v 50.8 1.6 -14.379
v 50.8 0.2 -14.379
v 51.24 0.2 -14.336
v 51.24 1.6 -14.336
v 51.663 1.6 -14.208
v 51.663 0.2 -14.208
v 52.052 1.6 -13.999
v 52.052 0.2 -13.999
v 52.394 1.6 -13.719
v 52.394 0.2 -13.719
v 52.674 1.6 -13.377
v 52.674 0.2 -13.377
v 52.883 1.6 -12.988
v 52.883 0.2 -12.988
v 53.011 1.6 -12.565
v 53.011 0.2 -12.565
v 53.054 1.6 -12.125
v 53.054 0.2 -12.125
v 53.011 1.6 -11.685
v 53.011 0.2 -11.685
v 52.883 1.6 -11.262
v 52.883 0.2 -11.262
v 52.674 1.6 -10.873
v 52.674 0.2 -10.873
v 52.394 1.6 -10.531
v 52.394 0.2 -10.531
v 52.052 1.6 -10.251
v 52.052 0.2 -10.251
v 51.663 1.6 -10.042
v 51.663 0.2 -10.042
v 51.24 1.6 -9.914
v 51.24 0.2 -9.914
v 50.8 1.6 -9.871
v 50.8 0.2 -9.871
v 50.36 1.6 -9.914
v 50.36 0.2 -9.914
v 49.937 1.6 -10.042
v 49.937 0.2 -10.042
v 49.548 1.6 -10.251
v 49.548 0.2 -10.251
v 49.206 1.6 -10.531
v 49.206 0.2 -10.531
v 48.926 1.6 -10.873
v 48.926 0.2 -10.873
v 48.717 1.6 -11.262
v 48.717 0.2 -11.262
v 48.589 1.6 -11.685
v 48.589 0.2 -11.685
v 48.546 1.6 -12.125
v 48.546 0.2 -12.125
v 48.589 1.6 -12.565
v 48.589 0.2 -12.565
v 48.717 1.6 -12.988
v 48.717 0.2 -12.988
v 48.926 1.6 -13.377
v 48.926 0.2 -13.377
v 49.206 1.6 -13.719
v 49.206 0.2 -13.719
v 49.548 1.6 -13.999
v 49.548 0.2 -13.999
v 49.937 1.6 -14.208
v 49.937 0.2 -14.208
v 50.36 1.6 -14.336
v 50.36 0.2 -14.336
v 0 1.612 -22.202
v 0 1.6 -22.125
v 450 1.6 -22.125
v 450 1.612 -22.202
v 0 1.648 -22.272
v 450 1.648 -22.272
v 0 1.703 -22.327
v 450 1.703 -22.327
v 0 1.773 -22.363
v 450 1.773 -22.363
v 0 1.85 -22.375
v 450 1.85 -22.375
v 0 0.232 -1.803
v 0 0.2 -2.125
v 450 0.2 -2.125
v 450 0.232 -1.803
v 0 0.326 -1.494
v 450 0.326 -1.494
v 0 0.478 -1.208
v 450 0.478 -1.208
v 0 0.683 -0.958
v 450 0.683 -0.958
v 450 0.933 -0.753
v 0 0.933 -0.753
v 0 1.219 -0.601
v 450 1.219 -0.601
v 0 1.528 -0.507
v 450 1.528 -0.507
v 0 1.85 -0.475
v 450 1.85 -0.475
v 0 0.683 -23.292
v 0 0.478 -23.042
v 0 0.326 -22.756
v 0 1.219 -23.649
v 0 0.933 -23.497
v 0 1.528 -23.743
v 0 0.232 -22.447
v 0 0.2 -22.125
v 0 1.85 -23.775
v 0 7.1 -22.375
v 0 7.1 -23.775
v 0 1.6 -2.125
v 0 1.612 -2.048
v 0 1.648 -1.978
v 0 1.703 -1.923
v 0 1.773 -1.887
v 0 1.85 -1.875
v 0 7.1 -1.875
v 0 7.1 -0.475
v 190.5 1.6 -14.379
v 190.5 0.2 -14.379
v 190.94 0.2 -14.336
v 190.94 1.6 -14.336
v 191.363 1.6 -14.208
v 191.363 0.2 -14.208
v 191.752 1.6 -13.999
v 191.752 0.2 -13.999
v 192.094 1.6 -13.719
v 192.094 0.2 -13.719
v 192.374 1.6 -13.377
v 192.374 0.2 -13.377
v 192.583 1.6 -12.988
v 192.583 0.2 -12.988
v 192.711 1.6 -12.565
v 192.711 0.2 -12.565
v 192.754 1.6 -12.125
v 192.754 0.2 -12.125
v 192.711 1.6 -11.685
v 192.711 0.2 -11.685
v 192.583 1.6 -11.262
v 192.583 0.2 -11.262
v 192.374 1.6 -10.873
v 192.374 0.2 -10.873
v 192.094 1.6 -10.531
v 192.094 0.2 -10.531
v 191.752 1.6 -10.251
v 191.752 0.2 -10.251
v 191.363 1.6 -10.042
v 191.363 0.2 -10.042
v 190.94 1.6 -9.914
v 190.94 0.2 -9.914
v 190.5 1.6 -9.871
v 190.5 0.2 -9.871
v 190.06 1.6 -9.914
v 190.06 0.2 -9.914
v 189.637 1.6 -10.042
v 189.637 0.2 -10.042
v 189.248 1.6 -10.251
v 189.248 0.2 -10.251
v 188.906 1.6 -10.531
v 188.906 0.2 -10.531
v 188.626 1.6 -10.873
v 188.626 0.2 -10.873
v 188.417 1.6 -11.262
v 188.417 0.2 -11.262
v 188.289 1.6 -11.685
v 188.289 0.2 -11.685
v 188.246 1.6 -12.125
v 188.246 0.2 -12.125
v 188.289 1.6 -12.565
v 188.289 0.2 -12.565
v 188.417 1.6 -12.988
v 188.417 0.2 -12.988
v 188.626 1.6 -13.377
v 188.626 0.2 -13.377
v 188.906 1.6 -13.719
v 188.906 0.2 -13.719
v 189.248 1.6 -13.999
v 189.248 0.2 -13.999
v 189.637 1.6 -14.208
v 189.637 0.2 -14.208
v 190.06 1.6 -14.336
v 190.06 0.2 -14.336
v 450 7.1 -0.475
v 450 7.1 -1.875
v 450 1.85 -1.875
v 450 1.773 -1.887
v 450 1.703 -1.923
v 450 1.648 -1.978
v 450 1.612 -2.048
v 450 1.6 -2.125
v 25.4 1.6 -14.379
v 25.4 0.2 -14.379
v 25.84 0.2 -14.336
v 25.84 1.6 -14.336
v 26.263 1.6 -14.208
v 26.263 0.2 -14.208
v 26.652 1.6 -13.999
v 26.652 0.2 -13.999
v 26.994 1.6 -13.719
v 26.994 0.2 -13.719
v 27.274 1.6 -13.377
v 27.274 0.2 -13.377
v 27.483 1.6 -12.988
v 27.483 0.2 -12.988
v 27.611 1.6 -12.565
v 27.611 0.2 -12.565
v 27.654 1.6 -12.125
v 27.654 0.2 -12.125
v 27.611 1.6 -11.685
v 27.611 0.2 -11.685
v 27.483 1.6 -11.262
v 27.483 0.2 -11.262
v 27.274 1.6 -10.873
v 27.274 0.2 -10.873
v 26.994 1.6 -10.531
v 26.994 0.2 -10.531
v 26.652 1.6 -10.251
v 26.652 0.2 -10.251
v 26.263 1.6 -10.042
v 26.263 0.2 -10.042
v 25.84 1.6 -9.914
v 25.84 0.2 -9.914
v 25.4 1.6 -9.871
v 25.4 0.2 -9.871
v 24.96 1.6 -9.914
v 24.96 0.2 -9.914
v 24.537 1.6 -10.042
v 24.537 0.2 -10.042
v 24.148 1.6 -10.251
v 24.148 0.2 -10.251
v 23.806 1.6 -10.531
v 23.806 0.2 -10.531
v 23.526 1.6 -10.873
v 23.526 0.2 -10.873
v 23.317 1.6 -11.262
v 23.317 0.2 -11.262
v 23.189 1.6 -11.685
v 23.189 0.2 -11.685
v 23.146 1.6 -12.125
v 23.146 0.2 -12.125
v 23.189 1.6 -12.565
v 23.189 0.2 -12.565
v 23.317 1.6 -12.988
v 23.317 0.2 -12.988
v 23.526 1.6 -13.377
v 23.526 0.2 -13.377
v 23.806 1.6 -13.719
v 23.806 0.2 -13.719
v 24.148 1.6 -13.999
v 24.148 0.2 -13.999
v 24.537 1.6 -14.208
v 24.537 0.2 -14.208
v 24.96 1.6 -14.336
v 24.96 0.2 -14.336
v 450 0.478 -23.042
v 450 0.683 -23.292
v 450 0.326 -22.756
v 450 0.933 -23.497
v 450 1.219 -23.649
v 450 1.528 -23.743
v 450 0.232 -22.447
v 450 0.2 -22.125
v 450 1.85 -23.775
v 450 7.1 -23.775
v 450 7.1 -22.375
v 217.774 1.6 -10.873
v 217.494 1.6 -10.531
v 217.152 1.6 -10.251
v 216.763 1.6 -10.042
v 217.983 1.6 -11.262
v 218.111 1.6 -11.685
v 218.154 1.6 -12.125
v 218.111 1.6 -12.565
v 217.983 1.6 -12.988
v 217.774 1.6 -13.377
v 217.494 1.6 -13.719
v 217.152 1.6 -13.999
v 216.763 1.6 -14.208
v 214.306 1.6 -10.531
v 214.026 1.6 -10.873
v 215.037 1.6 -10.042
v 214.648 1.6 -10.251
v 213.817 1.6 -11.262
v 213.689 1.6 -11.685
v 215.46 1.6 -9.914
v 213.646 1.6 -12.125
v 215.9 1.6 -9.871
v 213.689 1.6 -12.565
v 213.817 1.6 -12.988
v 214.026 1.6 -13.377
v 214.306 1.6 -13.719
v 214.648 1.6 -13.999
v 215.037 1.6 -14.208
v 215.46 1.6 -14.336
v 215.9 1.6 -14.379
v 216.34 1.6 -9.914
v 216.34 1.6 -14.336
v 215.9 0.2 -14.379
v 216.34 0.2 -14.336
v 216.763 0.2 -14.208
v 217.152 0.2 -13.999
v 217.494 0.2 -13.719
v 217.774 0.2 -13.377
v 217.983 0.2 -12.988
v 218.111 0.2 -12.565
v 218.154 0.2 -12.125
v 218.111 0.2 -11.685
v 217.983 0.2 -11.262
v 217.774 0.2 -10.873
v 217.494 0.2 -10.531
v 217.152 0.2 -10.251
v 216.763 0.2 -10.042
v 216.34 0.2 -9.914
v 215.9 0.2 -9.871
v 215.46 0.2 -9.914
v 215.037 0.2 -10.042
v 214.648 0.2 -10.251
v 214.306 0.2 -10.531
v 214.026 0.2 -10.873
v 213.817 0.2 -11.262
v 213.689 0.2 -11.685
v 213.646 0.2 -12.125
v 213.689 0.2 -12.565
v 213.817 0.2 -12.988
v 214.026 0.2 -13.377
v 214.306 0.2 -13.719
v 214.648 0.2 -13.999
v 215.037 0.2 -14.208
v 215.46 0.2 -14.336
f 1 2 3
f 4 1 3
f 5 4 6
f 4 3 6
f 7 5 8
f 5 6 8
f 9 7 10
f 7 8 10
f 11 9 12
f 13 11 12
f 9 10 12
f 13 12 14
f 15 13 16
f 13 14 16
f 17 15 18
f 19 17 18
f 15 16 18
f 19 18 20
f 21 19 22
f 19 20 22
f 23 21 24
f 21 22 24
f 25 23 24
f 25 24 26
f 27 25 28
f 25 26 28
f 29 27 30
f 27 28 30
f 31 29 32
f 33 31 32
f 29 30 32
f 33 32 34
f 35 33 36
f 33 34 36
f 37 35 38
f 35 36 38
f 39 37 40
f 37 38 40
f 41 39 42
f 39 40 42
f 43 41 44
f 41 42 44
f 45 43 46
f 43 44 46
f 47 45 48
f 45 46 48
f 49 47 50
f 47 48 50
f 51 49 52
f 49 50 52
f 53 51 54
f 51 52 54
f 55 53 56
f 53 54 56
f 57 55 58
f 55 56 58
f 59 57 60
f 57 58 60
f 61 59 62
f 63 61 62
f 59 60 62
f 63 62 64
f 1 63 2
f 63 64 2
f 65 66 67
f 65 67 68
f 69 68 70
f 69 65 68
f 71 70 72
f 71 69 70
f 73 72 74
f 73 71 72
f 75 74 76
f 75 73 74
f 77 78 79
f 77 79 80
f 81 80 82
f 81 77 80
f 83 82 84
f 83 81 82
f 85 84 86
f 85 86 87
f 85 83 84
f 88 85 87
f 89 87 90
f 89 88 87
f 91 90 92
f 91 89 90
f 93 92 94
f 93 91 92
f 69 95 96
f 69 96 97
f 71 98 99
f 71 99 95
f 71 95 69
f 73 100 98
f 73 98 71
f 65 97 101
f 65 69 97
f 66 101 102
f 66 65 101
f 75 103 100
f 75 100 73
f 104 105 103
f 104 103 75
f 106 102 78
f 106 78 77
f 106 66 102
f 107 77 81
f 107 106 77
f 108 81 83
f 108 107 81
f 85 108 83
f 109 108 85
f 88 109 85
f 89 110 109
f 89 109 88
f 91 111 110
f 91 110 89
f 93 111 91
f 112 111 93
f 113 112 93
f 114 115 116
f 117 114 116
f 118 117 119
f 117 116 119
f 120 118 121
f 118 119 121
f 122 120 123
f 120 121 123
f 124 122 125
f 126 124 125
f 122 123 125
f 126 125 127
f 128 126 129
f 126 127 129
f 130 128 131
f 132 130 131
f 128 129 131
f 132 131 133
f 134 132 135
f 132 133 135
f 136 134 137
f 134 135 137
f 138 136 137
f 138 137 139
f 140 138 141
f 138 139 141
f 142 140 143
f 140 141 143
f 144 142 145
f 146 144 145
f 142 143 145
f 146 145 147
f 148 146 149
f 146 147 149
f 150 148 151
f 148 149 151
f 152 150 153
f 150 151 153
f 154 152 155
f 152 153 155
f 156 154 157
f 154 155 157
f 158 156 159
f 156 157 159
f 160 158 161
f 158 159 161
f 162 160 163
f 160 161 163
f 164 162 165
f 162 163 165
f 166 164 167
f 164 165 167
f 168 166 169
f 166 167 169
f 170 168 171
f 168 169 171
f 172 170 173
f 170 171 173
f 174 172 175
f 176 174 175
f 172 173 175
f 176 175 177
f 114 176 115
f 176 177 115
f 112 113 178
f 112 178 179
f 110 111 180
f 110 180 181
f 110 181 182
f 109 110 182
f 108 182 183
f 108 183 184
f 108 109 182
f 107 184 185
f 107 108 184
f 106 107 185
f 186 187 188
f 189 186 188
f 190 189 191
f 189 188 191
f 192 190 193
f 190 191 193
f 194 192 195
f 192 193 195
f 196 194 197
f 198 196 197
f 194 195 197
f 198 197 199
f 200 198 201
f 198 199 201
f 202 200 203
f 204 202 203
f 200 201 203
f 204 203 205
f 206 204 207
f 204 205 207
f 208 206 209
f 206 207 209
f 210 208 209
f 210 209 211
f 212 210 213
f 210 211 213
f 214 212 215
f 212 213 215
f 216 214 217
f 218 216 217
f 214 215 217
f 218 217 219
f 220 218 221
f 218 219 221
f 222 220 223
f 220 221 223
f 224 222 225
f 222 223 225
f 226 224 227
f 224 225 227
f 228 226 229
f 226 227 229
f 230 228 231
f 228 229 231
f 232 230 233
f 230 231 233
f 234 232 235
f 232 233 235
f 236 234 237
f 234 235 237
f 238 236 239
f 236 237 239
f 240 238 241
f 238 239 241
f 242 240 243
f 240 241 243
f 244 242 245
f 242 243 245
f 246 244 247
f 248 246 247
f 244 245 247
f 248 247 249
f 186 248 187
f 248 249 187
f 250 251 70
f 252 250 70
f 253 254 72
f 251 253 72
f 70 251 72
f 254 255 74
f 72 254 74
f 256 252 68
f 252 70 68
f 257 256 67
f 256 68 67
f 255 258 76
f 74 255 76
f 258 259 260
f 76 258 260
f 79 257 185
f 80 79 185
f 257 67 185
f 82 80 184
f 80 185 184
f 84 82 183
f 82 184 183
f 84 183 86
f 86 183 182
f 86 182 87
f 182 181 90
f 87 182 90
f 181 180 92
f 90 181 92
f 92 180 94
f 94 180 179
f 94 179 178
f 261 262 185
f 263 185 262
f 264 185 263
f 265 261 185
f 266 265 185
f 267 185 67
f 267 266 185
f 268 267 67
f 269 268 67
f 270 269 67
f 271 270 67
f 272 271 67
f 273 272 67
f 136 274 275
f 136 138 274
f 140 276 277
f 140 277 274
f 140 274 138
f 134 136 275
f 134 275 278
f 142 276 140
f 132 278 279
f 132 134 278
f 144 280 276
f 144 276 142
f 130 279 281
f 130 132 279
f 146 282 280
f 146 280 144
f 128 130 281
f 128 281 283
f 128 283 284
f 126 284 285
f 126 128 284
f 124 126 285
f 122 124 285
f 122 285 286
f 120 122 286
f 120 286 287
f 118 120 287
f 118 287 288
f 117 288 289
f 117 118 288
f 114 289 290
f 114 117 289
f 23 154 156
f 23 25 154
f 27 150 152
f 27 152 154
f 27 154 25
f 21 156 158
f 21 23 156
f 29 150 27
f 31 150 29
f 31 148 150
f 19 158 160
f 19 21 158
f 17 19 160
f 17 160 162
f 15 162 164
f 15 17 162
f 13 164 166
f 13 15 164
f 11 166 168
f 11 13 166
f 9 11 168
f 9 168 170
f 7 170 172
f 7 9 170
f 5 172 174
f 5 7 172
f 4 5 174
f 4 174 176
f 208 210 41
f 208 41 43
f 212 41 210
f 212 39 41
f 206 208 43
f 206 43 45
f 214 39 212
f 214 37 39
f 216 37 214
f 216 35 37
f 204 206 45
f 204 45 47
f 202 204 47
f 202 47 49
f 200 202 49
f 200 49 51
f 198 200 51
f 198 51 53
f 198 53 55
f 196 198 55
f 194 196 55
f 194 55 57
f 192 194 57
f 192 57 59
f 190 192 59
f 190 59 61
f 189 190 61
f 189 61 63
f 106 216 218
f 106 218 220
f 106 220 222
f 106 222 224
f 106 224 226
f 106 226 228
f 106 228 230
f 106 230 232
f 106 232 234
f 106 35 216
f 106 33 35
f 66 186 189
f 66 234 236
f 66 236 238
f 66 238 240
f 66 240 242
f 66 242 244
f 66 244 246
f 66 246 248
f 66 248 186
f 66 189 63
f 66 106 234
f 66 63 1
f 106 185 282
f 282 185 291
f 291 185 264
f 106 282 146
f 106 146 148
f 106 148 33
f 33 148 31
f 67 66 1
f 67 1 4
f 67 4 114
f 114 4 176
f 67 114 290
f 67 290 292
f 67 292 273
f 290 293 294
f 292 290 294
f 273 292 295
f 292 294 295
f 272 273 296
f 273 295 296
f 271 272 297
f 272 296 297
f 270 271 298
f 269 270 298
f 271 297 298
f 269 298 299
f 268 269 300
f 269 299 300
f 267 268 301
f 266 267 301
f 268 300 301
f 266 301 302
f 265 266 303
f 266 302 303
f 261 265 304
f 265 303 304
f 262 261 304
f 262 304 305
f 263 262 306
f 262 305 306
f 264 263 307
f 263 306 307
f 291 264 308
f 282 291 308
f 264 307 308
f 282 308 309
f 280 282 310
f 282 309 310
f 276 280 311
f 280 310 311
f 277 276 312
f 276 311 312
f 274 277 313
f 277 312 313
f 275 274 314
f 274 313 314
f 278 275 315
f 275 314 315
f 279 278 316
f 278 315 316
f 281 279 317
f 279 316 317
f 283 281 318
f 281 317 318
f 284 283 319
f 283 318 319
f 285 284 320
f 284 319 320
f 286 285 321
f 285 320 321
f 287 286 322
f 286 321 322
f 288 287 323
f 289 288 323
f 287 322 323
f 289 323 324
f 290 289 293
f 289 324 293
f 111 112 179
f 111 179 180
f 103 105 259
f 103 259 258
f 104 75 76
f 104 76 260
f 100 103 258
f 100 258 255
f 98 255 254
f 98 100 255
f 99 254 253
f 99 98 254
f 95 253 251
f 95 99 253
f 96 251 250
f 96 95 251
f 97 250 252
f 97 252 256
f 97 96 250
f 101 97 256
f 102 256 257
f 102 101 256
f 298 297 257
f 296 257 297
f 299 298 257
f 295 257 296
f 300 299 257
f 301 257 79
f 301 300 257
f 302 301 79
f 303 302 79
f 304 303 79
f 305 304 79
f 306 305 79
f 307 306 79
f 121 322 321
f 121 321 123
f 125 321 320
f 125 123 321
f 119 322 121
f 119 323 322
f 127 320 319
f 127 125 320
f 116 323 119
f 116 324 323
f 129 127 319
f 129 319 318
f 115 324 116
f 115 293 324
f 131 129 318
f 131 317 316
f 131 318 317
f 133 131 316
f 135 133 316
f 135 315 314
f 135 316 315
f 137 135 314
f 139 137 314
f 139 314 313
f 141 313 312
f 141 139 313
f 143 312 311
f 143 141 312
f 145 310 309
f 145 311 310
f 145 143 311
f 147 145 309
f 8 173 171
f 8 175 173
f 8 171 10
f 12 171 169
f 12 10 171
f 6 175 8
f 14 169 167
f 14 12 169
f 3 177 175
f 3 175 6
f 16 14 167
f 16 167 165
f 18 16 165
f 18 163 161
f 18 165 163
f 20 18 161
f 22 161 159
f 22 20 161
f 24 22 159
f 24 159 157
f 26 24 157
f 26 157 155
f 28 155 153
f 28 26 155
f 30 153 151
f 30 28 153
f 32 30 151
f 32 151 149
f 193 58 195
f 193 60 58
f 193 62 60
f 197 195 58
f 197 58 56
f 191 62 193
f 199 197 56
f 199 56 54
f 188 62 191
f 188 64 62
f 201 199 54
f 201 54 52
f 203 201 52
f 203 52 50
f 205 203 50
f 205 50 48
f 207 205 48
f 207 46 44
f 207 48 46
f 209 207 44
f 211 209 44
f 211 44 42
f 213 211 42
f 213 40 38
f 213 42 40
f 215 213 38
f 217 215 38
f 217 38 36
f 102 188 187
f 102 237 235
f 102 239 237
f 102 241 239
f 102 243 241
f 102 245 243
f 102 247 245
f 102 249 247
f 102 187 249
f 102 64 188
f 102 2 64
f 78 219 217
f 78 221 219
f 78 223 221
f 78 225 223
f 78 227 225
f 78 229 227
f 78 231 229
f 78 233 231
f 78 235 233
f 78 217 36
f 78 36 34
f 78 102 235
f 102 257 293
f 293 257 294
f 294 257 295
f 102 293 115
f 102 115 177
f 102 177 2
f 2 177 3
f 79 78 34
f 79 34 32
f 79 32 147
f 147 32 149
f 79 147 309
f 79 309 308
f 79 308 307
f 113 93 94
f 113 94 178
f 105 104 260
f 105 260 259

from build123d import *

# Parameters (mm, degrees)
BASE_FLANGE1_DEPTH = 450
SKETCH3_R          = 2.25425
CUT_EXTRUDE1_DEPTH = 1.4


# Sheet-metal steps are written as plain solids
with BuildPart() as part:
    # Sketch2 → Base-Flange1 (new body)
    with BuildSketch(Plane(origin=(0, 0, 0), x_dir=(0, 0, -1), z_dir=(1, 0, 0))):
        with BuildLine():
            Line((1.875, 7.1), (1.875, 1.85))
            ThreePointArc((1.875, 1.85), (1.948223305, 1.673223305), (2.125, 1.6))
            Line((2.125, 1.6), (22.125, 1.6))
            ThreePointArc((22.125, 1.6), (22.301776695, 1.673223305), (22.375, 1.85))
            Line((22.375, 1.85), (22.375, 7.1))
            Line((22.375, 7.1), (23.775, 7.1))
            Line((23.775, 7.1), (23.775, 1.85))
            ThreePointArc((23.775, 1.85), (23.291726189, 0.683273811), (22.125, 0.2))
            Line((22.125, 0.2), (2.125, 0.2))
            ThreePointArc((2.125, 0.2), (0.958273811, 0.683273811), (0.475, 1.85))
            Line((0.475, 1.85), (0.475, 7.1))
            Line((0.475, 7.1), (1.875, 7.1))
        make_face()
    extrude(amount=BASE_FLANGE1_DEPTH)

    # Sketch3 → Cut-Extrude1 (cut)
    with BuildSketch(Plane.XZ.offset(-0.2)):
        with Locations(Location((25.4, -12.125, 0), (0, 0, 270))):
            Circle(SKETCH3_R)
        with Locations(Location((50.8, -12.125, 0), (0, 0, 270))):
            Circle(SKETCH3_R)
        with Locations(Location((215.9, -12.125, 0), (0, 0, 270))):
            Circle(SKETCH3_R)
        with Locations(Location((190.5, -12.125, 0), (0, 0, 270))):
            Circle(SKETCH3_R)
    extrude(amount=-CUT_EXTRUDE1_DEPTH, mode=Mode.SUBTRACT)


solid = part.part
